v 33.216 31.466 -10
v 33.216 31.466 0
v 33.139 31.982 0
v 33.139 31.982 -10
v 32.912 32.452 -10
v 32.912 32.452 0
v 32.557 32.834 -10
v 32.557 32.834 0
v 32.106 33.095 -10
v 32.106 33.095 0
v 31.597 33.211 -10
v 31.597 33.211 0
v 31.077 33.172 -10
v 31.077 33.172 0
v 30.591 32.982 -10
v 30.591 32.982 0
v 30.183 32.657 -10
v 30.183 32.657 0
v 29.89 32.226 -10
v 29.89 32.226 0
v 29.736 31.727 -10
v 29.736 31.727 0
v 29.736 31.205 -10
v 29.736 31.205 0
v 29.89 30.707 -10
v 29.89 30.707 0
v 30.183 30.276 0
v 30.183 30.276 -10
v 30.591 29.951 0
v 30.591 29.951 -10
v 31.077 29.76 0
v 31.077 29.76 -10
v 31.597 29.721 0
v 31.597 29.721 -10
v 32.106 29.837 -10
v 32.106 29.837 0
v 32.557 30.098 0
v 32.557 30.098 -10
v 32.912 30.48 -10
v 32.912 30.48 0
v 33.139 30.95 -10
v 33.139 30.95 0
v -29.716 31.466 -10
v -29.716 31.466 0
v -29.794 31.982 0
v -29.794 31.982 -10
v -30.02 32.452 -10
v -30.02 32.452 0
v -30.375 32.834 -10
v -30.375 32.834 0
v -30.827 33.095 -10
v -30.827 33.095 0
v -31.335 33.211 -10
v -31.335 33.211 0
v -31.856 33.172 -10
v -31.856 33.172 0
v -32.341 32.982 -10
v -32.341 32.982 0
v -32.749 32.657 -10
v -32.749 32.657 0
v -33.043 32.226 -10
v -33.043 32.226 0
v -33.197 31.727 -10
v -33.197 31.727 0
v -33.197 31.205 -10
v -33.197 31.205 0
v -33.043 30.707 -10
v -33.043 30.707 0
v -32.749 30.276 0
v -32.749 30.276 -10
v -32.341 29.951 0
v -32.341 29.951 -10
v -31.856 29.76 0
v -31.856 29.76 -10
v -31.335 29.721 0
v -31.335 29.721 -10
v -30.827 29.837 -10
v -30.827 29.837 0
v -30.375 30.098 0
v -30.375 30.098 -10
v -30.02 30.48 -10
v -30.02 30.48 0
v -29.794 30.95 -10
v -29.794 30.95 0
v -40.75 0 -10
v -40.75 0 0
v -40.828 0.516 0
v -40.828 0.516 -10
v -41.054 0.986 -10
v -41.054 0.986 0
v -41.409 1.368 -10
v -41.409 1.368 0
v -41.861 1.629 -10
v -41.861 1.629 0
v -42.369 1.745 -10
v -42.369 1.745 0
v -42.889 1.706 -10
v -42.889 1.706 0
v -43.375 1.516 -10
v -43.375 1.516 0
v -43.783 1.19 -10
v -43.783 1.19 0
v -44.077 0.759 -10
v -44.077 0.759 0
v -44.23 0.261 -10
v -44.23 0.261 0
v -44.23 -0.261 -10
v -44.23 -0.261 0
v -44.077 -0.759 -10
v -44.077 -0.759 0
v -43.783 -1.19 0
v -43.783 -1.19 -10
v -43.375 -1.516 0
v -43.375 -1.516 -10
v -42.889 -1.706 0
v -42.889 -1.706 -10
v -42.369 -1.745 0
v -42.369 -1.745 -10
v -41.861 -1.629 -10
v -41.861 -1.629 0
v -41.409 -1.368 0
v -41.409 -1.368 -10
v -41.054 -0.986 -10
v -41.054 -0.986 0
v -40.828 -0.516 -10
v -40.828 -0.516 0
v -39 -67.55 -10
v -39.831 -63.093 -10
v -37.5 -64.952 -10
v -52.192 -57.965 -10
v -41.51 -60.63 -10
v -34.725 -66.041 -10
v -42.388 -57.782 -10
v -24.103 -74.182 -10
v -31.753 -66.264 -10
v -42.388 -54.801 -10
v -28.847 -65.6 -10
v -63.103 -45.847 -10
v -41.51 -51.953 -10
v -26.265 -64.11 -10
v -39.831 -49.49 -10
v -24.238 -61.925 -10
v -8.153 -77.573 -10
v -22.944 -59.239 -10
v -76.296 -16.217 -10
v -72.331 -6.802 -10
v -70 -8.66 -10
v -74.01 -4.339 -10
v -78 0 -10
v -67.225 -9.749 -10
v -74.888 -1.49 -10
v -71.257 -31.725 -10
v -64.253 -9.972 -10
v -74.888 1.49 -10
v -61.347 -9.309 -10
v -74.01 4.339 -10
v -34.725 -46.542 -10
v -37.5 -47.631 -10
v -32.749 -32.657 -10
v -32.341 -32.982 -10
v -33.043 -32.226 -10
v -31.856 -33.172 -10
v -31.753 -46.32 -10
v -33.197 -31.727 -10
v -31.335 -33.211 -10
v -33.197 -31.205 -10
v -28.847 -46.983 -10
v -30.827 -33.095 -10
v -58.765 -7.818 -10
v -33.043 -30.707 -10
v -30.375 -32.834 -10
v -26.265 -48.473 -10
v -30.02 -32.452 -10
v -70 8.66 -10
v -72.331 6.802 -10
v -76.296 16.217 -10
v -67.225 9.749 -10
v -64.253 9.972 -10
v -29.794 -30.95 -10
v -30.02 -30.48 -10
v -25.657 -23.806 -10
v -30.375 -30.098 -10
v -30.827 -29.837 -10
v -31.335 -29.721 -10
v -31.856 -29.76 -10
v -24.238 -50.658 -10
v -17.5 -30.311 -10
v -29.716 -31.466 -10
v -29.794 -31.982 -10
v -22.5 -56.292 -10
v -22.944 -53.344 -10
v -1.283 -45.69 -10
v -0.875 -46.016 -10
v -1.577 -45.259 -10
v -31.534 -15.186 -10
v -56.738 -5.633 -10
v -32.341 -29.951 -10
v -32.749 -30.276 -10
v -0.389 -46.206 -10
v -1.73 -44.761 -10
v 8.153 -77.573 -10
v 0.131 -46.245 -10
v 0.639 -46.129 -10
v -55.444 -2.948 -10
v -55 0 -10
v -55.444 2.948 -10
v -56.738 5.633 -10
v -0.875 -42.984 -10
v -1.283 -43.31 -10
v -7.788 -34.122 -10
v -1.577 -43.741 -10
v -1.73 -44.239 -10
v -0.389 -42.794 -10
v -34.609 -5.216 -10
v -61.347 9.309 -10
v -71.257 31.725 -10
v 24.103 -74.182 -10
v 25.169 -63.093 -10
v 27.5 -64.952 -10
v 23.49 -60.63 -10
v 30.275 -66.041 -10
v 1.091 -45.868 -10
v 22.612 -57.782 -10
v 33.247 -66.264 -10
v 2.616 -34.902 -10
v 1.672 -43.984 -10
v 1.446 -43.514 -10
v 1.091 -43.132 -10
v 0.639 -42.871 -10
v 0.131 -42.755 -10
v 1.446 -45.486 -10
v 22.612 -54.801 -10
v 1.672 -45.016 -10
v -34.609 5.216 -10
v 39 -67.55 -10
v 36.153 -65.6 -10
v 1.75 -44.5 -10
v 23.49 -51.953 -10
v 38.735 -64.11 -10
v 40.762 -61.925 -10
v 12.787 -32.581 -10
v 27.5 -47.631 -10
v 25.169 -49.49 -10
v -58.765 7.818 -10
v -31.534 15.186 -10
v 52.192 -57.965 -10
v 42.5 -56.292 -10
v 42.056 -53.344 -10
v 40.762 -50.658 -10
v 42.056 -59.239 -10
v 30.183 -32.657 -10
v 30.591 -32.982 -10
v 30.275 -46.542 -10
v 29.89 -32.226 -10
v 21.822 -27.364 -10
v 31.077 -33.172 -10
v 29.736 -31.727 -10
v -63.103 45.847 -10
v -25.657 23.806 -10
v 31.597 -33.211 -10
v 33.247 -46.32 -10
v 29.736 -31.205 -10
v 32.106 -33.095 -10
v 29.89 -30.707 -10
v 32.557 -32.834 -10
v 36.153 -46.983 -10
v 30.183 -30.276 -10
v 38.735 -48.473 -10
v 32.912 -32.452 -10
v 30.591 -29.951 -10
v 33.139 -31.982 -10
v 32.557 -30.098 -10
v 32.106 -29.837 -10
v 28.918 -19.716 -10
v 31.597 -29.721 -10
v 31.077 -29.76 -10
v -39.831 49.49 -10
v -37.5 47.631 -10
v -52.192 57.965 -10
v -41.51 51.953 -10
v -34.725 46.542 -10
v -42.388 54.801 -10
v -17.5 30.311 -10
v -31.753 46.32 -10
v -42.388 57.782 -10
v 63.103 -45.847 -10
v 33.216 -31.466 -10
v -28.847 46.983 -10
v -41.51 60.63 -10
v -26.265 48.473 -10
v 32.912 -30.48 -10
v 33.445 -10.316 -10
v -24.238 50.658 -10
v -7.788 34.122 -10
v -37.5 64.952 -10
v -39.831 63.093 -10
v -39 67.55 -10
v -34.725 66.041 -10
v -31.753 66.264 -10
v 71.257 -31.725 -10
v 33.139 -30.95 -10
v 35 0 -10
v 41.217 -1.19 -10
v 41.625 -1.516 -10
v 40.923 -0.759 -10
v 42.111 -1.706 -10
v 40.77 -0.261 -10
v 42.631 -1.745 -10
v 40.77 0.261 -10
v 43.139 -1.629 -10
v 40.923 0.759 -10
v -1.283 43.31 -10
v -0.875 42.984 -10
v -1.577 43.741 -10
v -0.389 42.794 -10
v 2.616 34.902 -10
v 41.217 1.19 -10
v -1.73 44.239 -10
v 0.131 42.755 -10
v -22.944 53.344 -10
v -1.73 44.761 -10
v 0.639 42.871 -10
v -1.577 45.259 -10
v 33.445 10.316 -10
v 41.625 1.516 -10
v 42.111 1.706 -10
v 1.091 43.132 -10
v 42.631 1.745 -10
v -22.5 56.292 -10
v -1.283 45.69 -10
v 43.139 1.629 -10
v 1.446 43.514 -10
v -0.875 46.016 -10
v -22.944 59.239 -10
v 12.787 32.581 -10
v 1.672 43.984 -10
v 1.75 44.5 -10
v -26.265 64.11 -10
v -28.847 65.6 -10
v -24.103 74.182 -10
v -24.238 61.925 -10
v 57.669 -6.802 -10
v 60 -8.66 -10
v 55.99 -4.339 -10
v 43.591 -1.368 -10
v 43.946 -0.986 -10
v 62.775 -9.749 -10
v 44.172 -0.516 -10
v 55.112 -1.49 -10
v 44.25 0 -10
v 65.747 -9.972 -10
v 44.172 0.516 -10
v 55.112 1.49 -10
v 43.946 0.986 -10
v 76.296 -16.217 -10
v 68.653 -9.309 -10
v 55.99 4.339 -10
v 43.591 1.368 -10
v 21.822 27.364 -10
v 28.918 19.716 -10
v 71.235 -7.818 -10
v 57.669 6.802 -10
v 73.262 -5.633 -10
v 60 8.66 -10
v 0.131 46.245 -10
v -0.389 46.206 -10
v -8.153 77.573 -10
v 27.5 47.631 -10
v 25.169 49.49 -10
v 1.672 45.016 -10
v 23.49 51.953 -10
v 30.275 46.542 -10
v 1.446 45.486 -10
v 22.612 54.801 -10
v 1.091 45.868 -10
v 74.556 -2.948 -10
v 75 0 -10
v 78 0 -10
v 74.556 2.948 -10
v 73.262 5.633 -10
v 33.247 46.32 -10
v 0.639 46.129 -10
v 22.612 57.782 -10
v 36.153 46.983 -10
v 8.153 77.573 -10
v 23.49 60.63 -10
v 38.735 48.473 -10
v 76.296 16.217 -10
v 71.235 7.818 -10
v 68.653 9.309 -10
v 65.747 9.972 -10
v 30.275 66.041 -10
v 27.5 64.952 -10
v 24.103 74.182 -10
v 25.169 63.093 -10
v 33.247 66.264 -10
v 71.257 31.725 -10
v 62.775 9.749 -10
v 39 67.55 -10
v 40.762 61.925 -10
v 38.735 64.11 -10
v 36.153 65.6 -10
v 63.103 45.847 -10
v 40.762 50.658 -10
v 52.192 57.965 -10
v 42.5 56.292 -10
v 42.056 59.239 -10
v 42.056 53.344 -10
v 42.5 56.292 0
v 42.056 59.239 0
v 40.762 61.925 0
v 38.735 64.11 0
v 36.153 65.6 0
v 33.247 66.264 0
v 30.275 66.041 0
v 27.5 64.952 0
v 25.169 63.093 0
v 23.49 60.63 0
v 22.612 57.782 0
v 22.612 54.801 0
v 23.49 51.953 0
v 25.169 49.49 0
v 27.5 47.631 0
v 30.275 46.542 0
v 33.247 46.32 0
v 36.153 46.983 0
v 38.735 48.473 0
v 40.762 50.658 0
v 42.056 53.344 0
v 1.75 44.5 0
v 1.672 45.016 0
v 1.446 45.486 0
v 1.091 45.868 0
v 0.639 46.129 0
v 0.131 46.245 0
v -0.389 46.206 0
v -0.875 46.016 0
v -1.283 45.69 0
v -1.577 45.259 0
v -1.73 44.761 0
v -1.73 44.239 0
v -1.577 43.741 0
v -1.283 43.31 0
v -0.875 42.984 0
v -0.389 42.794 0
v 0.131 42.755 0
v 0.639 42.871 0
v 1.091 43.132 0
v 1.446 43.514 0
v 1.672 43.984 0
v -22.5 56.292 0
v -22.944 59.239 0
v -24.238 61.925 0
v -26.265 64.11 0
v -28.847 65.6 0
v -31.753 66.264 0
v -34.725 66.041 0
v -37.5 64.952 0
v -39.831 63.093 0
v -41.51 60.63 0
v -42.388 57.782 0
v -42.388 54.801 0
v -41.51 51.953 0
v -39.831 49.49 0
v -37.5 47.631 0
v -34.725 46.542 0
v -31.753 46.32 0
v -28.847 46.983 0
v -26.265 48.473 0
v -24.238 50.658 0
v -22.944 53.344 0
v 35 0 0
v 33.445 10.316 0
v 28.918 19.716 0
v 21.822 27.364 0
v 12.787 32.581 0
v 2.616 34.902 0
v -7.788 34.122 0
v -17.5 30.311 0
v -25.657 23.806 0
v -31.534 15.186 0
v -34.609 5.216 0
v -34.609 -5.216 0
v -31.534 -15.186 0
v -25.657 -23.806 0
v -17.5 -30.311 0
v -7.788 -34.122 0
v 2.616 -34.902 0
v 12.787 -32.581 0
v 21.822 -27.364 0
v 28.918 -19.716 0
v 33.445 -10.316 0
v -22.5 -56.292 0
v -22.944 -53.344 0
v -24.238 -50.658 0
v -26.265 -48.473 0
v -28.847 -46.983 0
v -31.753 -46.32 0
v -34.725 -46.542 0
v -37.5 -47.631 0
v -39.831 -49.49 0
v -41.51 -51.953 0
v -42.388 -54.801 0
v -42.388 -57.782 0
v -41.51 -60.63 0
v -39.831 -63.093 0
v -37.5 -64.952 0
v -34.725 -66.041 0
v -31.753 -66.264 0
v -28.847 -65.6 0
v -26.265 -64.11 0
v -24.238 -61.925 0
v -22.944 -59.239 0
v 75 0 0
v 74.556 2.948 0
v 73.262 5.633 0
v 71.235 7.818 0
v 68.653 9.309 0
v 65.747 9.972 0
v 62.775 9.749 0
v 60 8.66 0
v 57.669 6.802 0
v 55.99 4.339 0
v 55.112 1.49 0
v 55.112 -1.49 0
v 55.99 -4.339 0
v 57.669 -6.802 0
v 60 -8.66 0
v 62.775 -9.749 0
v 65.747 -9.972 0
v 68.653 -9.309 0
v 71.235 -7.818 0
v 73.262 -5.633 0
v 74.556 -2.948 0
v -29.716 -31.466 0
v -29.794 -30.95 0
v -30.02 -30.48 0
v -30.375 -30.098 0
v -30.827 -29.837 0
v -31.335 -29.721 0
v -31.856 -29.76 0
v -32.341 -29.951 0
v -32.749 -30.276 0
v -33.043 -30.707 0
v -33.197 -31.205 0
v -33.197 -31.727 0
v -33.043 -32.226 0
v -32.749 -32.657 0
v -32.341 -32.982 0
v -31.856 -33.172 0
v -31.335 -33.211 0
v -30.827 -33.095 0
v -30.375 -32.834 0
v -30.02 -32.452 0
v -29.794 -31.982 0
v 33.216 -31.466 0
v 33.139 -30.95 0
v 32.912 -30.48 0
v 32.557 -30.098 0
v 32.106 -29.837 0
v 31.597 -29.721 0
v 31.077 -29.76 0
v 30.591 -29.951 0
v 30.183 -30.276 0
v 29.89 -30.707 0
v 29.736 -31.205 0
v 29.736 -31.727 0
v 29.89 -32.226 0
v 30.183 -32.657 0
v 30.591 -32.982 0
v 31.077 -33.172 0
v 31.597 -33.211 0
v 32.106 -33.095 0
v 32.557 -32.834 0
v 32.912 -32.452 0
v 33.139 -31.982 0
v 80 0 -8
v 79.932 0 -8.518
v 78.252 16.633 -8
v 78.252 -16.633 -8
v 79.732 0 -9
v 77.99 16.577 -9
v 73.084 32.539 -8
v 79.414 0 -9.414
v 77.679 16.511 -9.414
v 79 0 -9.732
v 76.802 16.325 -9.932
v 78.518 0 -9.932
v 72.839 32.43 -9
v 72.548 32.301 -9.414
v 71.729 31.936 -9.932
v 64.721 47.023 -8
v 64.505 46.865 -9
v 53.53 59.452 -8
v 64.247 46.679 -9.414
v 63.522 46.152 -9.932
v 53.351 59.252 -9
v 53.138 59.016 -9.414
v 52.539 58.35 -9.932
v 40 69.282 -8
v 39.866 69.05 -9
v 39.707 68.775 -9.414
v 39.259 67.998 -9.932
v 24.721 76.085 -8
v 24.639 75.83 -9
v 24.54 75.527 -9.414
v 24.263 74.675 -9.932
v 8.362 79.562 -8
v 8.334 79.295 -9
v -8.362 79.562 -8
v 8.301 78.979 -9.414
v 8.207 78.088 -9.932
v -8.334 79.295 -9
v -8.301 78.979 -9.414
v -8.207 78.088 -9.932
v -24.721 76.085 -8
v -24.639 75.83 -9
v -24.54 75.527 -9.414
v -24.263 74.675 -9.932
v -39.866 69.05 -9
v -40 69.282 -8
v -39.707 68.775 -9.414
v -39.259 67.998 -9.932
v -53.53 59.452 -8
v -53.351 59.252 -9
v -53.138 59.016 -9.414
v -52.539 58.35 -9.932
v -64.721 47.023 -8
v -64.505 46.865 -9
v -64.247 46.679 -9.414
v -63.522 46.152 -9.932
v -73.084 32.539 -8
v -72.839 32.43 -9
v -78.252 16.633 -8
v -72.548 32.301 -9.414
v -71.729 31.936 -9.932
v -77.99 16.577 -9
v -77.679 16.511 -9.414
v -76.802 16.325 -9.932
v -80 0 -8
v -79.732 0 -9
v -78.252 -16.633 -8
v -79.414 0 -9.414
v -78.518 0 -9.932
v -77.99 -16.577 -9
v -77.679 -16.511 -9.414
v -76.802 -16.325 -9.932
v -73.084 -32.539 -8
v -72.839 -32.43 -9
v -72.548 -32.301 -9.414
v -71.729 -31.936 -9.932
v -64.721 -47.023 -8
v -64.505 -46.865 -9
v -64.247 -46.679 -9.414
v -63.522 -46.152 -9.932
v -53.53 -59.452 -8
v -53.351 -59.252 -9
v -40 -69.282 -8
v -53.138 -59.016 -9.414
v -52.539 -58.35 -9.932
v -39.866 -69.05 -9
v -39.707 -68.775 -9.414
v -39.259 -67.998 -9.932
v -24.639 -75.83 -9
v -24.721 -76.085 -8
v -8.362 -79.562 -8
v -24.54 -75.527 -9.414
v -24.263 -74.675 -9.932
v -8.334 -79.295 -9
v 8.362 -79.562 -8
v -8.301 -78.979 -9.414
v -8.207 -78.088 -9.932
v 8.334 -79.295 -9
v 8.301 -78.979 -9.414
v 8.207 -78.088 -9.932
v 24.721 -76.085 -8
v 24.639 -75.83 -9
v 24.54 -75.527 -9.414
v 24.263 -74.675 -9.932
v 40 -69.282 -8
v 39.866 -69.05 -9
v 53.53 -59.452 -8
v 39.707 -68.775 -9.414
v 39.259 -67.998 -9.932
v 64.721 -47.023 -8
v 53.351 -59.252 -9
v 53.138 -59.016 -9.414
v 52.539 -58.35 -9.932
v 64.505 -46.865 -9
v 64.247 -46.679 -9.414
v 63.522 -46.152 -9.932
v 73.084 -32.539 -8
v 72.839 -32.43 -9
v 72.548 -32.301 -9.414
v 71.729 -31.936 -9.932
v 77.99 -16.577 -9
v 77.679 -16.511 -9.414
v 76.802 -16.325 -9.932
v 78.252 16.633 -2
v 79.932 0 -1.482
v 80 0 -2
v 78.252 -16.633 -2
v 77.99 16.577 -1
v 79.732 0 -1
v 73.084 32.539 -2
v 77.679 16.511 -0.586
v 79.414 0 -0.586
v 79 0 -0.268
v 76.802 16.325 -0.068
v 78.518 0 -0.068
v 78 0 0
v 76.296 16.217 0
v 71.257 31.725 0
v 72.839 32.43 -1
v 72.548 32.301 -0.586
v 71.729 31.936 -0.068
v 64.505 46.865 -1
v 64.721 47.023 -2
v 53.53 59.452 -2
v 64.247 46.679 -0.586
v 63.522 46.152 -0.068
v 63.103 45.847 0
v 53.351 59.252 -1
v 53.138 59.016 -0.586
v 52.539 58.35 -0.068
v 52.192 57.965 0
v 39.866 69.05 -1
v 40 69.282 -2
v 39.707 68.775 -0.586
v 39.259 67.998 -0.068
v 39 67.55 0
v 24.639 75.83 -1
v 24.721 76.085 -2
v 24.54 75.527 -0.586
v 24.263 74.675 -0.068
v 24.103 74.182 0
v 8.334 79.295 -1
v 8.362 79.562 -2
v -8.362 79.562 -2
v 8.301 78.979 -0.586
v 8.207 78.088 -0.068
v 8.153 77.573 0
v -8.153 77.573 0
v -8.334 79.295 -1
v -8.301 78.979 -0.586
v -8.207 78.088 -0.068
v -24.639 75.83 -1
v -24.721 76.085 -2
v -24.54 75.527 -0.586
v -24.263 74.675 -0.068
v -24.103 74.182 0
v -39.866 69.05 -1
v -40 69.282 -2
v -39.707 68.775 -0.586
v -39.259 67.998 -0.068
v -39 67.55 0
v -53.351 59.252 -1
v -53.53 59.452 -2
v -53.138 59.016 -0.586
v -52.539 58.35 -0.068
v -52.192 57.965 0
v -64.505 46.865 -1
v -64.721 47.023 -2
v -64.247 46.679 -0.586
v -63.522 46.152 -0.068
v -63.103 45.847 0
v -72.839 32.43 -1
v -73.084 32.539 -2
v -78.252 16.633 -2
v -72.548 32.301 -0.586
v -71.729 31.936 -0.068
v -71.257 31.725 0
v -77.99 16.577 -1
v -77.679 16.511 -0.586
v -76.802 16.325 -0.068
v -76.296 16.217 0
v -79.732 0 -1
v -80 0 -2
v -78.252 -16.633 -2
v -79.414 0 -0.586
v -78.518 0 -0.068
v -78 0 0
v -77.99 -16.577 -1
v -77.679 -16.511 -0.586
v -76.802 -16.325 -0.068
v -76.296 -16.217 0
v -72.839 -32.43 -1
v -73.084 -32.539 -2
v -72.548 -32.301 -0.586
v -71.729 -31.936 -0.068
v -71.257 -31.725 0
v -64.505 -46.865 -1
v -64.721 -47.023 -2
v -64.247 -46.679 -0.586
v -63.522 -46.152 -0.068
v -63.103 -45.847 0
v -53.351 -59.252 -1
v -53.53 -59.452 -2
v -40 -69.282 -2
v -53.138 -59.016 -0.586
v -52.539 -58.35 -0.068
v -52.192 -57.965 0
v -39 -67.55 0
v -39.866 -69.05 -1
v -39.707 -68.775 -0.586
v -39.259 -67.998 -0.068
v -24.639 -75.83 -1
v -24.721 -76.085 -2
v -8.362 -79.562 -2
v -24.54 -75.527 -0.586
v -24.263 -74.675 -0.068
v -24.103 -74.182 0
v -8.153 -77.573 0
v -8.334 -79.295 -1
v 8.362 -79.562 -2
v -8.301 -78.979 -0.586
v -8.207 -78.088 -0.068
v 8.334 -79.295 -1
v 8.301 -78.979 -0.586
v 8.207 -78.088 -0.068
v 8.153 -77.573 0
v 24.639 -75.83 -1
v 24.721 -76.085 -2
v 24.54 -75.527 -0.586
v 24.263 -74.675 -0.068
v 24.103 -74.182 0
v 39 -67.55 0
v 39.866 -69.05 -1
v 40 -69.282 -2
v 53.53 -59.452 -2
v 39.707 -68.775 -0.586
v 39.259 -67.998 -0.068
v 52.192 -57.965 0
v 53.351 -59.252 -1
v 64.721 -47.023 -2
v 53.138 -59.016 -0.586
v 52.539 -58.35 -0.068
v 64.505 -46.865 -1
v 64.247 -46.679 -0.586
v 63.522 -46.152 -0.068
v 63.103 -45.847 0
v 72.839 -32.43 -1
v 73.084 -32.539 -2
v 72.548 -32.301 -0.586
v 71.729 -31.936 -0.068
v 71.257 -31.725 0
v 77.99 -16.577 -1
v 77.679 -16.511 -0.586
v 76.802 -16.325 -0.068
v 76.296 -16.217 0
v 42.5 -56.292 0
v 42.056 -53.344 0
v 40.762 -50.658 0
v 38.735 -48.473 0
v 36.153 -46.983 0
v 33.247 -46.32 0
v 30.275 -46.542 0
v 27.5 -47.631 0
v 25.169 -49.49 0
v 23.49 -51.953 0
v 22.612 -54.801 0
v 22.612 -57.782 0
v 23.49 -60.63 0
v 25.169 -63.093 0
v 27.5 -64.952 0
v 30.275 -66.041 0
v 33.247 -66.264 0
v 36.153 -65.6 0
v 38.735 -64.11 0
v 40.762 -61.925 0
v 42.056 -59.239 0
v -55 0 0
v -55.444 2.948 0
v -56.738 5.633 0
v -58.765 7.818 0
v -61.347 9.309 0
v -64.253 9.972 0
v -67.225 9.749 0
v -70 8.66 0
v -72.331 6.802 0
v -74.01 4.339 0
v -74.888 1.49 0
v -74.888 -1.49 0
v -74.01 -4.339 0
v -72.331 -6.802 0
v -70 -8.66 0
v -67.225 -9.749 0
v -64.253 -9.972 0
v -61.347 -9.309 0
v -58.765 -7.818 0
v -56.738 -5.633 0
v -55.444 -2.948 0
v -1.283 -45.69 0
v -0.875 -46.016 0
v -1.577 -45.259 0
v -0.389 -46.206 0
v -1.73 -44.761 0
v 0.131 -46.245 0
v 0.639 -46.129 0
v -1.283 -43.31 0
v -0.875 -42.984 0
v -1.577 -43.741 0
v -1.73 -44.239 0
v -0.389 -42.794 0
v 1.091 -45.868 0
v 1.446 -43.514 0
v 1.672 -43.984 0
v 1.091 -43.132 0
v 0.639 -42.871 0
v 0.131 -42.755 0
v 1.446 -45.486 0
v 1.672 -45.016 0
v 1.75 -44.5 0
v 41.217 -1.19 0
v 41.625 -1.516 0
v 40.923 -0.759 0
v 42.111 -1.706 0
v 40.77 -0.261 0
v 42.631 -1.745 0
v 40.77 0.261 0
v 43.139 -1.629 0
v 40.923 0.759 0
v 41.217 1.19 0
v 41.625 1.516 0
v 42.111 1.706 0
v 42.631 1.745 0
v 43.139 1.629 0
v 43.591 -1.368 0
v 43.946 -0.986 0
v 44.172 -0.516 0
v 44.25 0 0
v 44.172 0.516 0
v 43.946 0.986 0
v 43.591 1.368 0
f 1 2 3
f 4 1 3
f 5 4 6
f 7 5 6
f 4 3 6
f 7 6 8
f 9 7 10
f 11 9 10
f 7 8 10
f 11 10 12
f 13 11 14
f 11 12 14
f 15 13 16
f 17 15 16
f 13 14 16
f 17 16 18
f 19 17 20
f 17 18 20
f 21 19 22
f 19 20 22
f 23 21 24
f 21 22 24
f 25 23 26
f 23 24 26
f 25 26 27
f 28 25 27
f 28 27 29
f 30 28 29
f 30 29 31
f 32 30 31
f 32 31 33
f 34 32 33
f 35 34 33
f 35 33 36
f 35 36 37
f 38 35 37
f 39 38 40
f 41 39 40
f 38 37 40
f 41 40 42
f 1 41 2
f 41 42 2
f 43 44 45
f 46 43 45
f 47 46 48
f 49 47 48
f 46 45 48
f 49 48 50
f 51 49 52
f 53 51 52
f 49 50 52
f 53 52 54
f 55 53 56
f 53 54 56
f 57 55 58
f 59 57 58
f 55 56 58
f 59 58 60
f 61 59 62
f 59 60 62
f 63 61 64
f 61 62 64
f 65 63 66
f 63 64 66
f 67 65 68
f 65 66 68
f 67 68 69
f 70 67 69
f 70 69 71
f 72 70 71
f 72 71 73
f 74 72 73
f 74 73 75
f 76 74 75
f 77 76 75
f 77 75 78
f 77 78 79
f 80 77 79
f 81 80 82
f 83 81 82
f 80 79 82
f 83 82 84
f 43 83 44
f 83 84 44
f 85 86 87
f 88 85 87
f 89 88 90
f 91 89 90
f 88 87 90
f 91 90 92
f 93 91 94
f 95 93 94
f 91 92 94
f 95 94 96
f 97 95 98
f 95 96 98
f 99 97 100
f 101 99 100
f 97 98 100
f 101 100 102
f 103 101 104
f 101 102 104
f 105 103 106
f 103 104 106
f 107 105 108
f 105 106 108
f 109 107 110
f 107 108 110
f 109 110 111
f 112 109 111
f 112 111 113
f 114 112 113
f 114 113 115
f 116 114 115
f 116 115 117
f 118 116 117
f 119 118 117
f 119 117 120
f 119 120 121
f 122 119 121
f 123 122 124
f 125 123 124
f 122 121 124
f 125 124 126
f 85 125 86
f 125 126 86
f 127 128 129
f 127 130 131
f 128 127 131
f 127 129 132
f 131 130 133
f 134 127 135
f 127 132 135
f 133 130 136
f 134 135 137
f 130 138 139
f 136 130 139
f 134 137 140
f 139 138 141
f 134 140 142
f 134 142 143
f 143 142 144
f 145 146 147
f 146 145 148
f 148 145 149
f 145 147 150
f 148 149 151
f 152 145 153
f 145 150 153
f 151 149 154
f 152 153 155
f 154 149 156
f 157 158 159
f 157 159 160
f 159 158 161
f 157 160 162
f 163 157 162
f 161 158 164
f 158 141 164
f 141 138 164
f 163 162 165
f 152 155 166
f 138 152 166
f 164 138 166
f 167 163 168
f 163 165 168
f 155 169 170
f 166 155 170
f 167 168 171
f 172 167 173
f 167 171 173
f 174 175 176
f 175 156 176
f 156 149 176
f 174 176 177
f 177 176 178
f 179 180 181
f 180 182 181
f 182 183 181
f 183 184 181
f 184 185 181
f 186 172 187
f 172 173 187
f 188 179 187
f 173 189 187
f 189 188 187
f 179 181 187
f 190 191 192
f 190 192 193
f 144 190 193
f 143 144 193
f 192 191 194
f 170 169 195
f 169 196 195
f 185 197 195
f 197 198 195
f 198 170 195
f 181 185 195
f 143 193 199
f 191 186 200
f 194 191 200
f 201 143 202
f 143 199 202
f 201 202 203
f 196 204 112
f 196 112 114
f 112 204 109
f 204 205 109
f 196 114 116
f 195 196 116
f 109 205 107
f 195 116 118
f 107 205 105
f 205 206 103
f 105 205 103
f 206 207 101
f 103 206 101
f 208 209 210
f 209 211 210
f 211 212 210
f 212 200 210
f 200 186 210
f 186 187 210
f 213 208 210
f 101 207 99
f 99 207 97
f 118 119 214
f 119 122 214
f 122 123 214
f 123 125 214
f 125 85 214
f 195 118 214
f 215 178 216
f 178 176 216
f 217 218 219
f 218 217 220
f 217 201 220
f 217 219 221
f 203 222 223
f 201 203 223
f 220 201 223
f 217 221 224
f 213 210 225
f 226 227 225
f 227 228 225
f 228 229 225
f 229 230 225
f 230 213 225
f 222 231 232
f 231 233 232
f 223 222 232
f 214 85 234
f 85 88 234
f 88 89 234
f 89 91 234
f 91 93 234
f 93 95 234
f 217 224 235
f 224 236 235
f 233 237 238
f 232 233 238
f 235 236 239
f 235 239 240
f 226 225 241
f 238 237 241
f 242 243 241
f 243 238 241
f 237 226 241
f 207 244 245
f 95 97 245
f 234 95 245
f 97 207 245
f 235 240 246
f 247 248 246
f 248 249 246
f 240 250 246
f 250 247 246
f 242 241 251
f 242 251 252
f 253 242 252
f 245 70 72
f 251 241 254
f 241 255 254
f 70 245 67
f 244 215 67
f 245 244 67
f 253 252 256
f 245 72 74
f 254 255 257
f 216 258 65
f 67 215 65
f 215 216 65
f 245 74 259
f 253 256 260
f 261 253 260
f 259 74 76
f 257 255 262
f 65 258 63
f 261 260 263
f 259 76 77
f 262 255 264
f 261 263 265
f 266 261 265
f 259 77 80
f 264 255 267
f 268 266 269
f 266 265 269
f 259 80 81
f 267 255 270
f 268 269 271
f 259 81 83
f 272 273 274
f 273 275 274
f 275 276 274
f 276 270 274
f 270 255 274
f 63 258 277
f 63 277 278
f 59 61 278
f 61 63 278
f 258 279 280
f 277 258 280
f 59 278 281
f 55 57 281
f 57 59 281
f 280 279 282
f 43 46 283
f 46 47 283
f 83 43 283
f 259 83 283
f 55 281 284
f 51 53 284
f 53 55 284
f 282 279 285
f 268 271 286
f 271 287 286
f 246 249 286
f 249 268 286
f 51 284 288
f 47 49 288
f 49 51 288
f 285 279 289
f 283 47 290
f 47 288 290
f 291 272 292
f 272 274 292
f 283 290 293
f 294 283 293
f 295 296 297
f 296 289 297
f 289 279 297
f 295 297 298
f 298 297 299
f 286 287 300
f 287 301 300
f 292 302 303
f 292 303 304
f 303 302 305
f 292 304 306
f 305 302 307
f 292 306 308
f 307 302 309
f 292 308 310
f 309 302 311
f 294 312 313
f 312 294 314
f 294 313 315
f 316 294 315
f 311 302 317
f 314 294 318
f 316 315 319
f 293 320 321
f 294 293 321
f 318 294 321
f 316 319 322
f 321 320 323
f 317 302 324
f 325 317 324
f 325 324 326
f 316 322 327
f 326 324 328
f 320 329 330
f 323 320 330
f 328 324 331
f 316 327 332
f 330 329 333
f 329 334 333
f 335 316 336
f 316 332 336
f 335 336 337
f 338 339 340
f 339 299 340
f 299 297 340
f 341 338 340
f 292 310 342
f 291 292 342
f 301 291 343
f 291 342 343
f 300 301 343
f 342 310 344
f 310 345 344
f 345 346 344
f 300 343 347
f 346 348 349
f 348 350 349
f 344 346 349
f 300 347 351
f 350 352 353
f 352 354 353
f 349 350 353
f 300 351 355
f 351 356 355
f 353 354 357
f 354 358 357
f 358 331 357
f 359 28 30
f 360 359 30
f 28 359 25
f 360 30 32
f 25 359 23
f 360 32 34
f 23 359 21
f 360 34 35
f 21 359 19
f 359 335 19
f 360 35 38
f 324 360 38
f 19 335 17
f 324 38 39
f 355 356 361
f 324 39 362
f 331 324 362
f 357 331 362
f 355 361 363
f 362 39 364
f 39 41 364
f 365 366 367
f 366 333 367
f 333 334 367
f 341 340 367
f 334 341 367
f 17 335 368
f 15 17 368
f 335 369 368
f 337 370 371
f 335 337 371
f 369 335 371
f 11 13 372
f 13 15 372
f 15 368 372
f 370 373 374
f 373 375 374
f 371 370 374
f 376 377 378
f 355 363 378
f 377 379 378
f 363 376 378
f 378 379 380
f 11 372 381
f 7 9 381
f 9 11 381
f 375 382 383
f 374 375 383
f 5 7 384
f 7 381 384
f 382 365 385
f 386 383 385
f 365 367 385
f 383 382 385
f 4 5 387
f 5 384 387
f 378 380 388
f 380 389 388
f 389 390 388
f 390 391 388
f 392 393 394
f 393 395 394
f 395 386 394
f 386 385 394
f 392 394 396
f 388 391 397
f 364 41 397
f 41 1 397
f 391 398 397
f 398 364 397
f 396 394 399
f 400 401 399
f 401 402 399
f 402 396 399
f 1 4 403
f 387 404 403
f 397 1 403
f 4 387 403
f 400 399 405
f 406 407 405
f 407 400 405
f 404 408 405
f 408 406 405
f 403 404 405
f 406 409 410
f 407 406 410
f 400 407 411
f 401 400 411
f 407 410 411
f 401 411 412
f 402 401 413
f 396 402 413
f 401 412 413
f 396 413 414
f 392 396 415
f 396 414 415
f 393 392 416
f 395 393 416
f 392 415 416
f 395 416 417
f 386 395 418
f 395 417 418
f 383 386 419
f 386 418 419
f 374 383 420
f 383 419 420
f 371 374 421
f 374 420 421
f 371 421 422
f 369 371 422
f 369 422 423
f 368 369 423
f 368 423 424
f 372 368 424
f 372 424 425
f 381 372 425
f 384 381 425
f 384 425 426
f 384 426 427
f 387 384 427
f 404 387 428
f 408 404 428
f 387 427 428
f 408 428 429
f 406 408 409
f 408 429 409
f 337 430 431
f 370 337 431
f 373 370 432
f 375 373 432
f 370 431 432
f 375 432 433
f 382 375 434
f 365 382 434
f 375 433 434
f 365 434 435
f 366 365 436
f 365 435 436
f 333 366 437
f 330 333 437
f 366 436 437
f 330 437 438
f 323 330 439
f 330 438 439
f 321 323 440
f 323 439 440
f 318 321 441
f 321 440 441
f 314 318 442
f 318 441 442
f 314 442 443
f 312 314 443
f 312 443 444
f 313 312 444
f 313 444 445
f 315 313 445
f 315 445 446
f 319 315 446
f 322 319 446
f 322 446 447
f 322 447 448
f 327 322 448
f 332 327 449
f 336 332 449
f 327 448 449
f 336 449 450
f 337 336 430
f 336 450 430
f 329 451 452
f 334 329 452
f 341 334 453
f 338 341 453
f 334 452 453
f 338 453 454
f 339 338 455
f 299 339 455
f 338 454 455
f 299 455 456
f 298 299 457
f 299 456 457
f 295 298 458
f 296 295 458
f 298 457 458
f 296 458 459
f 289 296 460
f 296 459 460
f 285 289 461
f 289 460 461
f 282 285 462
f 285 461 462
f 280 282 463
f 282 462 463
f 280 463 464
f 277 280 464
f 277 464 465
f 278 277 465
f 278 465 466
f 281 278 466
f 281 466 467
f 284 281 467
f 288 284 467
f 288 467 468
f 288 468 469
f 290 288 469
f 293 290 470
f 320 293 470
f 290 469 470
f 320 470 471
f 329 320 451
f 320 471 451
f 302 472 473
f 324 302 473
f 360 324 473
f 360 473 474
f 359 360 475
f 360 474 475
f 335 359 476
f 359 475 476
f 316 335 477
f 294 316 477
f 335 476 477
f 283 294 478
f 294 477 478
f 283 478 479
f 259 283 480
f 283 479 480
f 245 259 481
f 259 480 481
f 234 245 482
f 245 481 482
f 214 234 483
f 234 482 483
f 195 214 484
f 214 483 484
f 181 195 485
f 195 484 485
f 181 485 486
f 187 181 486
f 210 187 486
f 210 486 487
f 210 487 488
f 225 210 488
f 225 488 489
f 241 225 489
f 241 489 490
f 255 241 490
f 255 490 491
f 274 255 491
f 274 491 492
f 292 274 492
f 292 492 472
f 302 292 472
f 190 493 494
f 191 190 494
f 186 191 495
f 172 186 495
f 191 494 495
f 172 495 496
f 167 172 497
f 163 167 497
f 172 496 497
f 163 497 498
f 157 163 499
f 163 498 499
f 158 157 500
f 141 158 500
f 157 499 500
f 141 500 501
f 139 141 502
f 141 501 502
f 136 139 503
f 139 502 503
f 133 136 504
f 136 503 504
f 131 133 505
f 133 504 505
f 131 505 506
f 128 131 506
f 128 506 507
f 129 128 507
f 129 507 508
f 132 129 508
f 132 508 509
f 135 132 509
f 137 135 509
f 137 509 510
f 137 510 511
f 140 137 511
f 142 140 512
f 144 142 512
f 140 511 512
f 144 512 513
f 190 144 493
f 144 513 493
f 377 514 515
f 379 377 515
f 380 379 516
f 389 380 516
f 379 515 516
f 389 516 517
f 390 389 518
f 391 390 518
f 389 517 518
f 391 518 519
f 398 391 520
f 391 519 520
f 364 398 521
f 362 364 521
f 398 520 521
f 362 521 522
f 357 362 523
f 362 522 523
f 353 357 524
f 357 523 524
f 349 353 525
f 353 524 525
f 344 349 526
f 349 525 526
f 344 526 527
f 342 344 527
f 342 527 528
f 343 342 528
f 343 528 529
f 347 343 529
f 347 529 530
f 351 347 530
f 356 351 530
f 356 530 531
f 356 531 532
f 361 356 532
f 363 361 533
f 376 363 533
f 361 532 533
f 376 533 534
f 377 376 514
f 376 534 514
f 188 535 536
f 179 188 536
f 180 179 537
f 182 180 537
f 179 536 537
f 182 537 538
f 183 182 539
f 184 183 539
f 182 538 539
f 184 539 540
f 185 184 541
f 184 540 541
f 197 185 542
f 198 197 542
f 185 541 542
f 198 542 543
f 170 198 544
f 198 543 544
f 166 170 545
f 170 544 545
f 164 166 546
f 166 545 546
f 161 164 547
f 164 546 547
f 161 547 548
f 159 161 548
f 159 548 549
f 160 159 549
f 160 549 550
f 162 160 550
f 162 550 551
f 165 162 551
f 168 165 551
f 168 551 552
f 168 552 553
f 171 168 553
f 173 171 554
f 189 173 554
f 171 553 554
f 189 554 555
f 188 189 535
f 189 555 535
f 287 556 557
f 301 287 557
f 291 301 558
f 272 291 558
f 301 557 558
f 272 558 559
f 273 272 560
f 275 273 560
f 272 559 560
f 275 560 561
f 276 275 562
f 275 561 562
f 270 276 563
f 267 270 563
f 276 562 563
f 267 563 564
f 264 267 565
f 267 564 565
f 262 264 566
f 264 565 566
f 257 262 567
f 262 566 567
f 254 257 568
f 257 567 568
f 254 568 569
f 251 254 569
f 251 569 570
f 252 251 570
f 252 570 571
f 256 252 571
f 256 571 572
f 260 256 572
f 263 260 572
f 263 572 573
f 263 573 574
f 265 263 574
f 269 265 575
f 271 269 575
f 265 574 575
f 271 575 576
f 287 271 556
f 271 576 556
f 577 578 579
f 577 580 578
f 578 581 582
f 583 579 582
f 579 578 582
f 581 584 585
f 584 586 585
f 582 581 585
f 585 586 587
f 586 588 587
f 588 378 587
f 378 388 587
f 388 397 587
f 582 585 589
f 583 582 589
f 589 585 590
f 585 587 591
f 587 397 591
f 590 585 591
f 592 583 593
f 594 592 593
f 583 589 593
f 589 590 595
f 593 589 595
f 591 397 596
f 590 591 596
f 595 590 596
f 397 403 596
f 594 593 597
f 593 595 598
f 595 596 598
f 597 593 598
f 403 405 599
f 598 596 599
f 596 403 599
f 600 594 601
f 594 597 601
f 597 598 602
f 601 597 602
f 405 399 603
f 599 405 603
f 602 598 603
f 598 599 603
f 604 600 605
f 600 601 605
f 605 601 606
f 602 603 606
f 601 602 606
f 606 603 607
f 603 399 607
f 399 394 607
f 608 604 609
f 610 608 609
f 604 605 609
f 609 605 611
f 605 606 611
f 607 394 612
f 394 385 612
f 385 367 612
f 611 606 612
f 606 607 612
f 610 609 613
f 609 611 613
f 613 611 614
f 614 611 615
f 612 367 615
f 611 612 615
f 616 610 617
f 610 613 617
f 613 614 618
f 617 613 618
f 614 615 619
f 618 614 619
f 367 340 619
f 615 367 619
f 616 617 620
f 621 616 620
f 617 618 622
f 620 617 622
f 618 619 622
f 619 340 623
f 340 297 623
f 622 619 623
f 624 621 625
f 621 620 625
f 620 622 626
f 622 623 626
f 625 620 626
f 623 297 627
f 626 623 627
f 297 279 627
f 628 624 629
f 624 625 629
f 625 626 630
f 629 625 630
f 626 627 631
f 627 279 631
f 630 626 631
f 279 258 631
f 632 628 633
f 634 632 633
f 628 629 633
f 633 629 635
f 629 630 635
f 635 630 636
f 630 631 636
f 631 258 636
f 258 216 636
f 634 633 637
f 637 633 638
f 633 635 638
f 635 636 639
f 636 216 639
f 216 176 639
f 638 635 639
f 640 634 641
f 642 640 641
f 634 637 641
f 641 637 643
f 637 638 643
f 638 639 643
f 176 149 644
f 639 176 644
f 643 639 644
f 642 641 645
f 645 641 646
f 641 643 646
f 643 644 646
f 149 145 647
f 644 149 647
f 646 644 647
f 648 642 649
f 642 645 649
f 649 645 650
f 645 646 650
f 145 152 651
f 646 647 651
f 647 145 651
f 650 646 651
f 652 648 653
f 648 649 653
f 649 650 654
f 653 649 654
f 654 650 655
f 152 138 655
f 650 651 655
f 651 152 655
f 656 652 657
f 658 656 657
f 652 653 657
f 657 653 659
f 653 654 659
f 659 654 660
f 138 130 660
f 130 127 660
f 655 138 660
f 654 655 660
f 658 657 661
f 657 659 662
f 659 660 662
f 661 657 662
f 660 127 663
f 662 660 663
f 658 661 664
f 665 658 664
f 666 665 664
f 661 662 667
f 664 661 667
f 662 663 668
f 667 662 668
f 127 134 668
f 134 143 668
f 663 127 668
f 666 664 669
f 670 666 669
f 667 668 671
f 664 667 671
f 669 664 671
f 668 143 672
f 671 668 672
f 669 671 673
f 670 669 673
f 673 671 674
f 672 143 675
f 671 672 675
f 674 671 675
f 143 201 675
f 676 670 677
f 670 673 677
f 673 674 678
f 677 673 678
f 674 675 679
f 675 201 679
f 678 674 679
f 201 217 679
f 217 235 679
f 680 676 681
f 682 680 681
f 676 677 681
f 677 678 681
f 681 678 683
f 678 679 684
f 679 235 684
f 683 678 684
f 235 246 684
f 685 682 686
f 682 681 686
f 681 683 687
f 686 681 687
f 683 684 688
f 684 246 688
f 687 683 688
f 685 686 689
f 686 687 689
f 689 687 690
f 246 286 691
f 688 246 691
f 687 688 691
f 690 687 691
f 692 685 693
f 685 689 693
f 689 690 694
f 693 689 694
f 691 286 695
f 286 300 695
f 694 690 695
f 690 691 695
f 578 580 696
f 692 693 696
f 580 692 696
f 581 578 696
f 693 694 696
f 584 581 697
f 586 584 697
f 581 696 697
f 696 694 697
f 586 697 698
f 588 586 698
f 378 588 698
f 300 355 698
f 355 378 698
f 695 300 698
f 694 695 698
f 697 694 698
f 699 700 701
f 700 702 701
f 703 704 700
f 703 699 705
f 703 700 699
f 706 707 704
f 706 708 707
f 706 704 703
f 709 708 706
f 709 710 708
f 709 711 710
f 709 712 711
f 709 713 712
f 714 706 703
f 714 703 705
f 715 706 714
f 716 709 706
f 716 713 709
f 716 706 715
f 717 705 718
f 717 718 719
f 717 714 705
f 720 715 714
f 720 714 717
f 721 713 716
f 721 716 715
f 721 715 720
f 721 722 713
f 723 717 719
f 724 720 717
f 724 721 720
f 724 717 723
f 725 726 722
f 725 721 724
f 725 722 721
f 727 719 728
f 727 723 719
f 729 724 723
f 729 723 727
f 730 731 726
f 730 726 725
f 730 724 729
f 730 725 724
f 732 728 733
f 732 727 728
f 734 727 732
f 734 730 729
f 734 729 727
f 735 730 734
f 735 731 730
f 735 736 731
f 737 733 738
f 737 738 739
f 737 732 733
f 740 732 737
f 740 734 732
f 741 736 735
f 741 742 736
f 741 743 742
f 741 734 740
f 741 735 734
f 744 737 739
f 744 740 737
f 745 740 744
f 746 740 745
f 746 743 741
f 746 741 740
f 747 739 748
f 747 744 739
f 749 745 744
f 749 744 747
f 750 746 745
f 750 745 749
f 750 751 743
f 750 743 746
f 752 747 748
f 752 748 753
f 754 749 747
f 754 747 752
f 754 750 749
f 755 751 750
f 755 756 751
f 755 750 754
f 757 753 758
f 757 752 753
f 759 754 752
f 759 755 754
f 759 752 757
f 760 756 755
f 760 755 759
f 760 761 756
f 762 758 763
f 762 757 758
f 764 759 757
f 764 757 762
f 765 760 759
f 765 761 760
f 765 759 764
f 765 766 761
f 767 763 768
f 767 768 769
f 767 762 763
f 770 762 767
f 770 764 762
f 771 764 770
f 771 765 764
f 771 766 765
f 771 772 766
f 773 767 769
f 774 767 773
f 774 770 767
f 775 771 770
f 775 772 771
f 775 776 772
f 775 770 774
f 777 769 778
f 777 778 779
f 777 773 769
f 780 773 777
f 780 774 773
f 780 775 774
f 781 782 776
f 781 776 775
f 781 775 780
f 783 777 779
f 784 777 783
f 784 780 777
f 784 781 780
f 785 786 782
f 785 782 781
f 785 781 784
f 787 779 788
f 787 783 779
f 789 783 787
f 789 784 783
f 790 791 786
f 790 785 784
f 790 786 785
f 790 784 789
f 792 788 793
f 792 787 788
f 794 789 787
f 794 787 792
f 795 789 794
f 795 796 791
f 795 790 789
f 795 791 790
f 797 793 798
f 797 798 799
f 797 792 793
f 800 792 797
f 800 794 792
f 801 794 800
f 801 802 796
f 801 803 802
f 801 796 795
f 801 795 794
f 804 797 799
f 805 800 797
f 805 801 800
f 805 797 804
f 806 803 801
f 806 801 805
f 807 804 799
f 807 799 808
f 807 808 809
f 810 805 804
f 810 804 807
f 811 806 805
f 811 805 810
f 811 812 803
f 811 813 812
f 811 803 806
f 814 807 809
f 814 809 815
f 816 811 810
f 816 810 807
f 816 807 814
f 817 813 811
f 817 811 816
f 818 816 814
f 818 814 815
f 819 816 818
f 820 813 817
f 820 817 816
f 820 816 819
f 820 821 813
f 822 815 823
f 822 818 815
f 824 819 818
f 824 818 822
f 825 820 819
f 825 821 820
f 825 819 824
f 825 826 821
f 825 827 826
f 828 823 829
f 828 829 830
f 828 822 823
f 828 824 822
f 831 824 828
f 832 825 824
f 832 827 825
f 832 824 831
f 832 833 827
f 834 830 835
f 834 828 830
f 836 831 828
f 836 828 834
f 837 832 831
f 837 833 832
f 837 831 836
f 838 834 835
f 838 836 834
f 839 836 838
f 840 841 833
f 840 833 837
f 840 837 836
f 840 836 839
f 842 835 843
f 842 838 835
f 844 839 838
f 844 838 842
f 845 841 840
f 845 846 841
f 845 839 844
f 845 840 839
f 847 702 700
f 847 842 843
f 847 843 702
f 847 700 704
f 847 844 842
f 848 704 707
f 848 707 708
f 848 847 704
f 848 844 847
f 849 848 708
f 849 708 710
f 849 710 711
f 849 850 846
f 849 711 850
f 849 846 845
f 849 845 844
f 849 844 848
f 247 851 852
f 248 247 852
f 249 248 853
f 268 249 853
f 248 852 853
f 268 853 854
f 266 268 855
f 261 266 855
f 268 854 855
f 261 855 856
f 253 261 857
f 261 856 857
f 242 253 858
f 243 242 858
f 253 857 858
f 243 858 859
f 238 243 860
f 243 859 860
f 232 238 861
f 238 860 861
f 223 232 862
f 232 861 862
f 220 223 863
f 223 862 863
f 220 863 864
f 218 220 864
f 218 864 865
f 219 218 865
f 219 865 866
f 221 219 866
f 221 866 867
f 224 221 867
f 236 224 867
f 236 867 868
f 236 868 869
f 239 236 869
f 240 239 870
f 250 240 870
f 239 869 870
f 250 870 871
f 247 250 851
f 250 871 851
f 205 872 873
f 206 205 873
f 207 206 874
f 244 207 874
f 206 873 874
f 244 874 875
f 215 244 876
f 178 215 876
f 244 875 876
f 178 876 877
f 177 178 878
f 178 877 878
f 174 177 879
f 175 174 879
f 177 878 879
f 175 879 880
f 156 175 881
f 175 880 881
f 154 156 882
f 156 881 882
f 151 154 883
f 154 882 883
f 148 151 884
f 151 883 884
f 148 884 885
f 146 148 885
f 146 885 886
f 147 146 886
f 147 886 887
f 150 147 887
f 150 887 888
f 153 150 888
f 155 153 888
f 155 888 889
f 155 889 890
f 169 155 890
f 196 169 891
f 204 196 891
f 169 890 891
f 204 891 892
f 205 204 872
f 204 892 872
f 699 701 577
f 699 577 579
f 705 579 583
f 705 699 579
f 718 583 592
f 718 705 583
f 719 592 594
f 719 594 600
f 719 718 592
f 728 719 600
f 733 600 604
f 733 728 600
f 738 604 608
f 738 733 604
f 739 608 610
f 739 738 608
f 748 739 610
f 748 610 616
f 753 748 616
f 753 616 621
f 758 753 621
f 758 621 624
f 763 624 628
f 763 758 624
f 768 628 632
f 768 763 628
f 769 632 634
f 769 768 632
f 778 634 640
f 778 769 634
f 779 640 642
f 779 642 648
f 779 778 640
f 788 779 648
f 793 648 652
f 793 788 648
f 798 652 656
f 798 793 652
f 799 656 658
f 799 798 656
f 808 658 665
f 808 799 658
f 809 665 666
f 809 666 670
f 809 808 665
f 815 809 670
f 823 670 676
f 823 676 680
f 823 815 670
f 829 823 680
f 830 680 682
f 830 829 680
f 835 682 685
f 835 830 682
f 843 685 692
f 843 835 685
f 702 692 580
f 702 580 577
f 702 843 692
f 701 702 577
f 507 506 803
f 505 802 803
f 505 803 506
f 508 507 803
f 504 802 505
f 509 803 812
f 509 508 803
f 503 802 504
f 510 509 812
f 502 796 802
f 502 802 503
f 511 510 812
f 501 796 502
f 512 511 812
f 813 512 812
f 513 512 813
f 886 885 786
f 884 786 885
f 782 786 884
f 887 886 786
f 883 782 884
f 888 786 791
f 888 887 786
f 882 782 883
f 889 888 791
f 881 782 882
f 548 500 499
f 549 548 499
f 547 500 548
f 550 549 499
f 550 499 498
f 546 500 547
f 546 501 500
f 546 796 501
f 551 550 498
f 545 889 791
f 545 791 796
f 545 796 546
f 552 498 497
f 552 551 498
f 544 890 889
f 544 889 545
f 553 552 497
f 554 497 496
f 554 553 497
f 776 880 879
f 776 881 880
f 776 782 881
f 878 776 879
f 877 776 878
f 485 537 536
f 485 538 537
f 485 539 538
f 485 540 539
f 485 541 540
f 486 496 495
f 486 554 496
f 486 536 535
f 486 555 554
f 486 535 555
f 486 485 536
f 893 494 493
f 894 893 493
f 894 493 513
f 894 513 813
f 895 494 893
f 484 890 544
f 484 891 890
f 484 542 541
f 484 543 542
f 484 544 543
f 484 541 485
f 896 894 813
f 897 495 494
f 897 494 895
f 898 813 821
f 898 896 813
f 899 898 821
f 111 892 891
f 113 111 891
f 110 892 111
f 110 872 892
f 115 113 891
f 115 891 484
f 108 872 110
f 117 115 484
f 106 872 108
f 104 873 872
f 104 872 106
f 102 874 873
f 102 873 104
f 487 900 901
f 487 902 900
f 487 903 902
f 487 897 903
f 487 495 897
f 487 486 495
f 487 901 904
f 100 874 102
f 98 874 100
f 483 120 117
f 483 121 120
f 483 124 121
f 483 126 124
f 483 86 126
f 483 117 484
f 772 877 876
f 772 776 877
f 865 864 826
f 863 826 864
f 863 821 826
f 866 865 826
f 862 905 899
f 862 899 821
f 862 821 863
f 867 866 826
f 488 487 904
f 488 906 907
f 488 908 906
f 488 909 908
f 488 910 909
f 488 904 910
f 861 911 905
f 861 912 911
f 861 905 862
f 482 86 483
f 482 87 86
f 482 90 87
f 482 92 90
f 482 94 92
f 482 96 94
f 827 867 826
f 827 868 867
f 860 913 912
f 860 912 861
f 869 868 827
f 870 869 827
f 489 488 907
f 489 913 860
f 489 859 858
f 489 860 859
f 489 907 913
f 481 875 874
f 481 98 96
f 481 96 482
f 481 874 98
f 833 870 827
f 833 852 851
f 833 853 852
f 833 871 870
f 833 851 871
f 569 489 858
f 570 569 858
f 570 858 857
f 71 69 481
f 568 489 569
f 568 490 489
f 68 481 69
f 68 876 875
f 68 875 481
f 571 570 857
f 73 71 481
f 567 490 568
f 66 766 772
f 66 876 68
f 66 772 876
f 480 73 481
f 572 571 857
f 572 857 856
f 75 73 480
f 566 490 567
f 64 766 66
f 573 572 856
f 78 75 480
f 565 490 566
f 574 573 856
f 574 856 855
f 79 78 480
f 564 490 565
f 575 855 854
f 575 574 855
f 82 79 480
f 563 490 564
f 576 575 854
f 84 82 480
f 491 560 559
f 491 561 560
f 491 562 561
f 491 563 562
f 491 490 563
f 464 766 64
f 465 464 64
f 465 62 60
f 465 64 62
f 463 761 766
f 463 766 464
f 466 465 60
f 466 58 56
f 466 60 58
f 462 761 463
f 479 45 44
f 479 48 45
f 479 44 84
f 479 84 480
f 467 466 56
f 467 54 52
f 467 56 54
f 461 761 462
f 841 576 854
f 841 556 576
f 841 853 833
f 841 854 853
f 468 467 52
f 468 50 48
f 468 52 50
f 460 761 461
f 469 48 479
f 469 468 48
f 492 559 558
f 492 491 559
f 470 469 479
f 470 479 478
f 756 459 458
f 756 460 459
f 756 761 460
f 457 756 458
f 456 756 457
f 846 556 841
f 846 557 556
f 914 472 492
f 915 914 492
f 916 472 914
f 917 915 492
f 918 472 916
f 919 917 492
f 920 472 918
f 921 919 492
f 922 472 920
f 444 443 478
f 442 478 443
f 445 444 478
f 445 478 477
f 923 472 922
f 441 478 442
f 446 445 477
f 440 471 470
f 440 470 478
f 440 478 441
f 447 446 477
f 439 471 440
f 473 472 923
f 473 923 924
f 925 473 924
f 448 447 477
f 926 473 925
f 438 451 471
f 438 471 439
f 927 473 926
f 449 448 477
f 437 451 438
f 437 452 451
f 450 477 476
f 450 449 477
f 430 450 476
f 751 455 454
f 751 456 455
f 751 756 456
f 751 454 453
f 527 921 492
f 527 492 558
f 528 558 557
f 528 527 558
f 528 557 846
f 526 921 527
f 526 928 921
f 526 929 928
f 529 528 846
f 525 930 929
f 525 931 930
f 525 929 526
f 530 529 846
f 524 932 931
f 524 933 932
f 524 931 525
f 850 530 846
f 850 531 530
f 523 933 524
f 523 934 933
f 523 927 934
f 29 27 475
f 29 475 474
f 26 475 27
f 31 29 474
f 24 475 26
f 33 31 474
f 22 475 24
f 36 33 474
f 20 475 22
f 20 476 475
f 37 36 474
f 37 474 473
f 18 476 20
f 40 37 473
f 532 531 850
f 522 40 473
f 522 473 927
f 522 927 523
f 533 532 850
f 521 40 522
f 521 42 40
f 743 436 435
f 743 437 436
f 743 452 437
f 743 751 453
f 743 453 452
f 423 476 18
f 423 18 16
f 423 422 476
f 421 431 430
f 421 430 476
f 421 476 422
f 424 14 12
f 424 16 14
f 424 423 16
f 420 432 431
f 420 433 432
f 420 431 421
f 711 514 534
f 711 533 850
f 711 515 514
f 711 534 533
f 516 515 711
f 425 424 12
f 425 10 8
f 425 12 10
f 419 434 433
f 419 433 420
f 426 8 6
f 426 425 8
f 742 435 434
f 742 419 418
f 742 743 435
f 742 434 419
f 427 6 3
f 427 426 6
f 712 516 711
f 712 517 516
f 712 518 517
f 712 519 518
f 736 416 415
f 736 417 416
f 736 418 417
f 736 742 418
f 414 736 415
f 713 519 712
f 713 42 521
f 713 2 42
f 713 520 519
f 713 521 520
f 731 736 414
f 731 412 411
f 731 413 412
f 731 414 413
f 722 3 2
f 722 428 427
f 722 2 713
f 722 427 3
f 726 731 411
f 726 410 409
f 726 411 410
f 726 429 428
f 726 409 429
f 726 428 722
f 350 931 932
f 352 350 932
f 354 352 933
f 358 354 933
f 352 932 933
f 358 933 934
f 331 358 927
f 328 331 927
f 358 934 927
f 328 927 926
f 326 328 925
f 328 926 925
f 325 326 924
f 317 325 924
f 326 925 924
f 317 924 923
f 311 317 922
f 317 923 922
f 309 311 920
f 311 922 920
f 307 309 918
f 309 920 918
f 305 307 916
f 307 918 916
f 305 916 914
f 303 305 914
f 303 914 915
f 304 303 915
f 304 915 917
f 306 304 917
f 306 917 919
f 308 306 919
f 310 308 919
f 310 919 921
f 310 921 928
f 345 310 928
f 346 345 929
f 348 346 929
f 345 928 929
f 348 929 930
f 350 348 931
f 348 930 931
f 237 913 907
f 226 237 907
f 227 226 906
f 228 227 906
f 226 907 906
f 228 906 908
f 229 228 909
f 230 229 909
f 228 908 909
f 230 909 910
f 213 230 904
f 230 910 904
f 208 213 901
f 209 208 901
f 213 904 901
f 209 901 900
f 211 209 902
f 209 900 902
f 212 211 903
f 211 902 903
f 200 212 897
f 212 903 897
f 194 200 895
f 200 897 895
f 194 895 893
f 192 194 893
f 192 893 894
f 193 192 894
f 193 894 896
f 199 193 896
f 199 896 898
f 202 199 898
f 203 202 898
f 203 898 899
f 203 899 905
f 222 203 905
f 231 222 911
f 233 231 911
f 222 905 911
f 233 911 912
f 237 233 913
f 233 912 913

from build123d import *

# Parameters (mm, degrees)
SKETCH_3_R          = 80
EXTRUDE_1_DEPTH     = 10
SKETCH_4_R          = 35
CUT_EXTRUDE_1_DEPTH = 7
SKETCH_6_R          = 10
CUT_EXTRUDE_3_DEPTH = 10
SKETCH_5_R          = 1.75
CUT_EXTRUDE_4_DEPTH = 10
SKETCH_7_R          = 35
CUT_EXTRUDE_5_DEPTH = 20
FILLET_1_R          = 2


with BuildPart() as part:
    # 草图3 → 凸台-拉伸1 (new body)
    with BuildSketch(Plane.XY):
        Circle(SKETCH_3_R)
    extrude(amount=-EXTRUDE_1_DEPTH)

    # 草图4 → 切除-拉伸1 (cut)
    with BuildSketch(Plane.XY):
        Circle(SKETCH_4_R)
    extrude(amount=-CUT_EXTRUDE_1_DEPTH, mode=Mode.SUBTRACT)

    # 草图6 → 切除-拉伸3 (cut)
    with BuildSketch(Plane.XY):
        with Locations((-32.5, 56.291651246)):
            Circle(SKETCH_6_R)
        with BuildLine():
            ThreePointArc((-75, 0), (-65, -10), (-55, 0))
            Line((-55, 0), (-75, 0))
        make_face()
        with BuildLine():
            Line((-75, 0), (-55, 0))
            ThreePointArc((-55, 0), (-65, 10), (-75, 0))
        make_face()
        with Locations((-32.5, -56.291651246)):
            Circle(SKETCH_6_R)
        with Locations((32.5, -56.291651246)):
            Circle(SKETCH_6_R)
        with Locations((65, 0)):
            Circle(SKETCH_6_R)
        with Locations((32.5, 56.291651246)):
            Circle(SKETCH_6_R)
    extrude(amount=-CUT_EXTRUDE_3_DEPTH, mode=Mode.SUBTRACT)

    # 草图5 → 切除-拉伸4 (cut)
    with BuildSketch(Plane.XY):
        with Locations((0, 44.5)):
            Circle(SKETCH_5_R)
        with Locations((31.466251763, 31.466251763)):
            Circle(SKETCH_5_R)
        with Locations((42.5, 0)):
            Circle(SKETCH_5_R)
        with Locations((31.466251763, -31.466251763)):
            Circle(SKETCH_5_R)
        with Locations((-31.466251763, -31.466251763)):
            Circle(SKETCH_5_R)
        with BuildLine():
            ThreePointArc((-44.25, 0), (-42.5, -1.75), (-40.75, 0))
            Line((-40.75, 0), (-44.25, 0))
        make_face()
        with BuildLine():
            Line((-44.25, 0), (-40.75, 0))
            ThreePointArc((-40.75, 0), (-42.5, 1.75), (-44.25, 0))
        make_face()
        with Locations((-31.466251763, 31.466251763)):
            Circle(SKETCH_5_R)
        with Locations((0, -44.5)):
            Circle(SKETCH_5_R)
    extrude(amount=-CUT_EXTRUDE_4_DEPTH, mode=Mode.SUBTRACT)

    # 草图7 → 切除-拉伸5 (cut, symmetric)
    with BuildSketch(Plane.XY):
        Circle(SKETCH_7_R)
    extrude(amount=CUT_EXTRUDE_5_DEPTH, both=True, mode=Mode.SUBTRACT)

    # 圆角1
    fillet_1_edges = [part.edges().sort_by_distance(p)[0] for p in [
        (-80, 0, 0),
        (-80, 0, -10),
    ]]
    fillet(fillet_1_edges, radius=FILLET_1_R)


solid = part.part
